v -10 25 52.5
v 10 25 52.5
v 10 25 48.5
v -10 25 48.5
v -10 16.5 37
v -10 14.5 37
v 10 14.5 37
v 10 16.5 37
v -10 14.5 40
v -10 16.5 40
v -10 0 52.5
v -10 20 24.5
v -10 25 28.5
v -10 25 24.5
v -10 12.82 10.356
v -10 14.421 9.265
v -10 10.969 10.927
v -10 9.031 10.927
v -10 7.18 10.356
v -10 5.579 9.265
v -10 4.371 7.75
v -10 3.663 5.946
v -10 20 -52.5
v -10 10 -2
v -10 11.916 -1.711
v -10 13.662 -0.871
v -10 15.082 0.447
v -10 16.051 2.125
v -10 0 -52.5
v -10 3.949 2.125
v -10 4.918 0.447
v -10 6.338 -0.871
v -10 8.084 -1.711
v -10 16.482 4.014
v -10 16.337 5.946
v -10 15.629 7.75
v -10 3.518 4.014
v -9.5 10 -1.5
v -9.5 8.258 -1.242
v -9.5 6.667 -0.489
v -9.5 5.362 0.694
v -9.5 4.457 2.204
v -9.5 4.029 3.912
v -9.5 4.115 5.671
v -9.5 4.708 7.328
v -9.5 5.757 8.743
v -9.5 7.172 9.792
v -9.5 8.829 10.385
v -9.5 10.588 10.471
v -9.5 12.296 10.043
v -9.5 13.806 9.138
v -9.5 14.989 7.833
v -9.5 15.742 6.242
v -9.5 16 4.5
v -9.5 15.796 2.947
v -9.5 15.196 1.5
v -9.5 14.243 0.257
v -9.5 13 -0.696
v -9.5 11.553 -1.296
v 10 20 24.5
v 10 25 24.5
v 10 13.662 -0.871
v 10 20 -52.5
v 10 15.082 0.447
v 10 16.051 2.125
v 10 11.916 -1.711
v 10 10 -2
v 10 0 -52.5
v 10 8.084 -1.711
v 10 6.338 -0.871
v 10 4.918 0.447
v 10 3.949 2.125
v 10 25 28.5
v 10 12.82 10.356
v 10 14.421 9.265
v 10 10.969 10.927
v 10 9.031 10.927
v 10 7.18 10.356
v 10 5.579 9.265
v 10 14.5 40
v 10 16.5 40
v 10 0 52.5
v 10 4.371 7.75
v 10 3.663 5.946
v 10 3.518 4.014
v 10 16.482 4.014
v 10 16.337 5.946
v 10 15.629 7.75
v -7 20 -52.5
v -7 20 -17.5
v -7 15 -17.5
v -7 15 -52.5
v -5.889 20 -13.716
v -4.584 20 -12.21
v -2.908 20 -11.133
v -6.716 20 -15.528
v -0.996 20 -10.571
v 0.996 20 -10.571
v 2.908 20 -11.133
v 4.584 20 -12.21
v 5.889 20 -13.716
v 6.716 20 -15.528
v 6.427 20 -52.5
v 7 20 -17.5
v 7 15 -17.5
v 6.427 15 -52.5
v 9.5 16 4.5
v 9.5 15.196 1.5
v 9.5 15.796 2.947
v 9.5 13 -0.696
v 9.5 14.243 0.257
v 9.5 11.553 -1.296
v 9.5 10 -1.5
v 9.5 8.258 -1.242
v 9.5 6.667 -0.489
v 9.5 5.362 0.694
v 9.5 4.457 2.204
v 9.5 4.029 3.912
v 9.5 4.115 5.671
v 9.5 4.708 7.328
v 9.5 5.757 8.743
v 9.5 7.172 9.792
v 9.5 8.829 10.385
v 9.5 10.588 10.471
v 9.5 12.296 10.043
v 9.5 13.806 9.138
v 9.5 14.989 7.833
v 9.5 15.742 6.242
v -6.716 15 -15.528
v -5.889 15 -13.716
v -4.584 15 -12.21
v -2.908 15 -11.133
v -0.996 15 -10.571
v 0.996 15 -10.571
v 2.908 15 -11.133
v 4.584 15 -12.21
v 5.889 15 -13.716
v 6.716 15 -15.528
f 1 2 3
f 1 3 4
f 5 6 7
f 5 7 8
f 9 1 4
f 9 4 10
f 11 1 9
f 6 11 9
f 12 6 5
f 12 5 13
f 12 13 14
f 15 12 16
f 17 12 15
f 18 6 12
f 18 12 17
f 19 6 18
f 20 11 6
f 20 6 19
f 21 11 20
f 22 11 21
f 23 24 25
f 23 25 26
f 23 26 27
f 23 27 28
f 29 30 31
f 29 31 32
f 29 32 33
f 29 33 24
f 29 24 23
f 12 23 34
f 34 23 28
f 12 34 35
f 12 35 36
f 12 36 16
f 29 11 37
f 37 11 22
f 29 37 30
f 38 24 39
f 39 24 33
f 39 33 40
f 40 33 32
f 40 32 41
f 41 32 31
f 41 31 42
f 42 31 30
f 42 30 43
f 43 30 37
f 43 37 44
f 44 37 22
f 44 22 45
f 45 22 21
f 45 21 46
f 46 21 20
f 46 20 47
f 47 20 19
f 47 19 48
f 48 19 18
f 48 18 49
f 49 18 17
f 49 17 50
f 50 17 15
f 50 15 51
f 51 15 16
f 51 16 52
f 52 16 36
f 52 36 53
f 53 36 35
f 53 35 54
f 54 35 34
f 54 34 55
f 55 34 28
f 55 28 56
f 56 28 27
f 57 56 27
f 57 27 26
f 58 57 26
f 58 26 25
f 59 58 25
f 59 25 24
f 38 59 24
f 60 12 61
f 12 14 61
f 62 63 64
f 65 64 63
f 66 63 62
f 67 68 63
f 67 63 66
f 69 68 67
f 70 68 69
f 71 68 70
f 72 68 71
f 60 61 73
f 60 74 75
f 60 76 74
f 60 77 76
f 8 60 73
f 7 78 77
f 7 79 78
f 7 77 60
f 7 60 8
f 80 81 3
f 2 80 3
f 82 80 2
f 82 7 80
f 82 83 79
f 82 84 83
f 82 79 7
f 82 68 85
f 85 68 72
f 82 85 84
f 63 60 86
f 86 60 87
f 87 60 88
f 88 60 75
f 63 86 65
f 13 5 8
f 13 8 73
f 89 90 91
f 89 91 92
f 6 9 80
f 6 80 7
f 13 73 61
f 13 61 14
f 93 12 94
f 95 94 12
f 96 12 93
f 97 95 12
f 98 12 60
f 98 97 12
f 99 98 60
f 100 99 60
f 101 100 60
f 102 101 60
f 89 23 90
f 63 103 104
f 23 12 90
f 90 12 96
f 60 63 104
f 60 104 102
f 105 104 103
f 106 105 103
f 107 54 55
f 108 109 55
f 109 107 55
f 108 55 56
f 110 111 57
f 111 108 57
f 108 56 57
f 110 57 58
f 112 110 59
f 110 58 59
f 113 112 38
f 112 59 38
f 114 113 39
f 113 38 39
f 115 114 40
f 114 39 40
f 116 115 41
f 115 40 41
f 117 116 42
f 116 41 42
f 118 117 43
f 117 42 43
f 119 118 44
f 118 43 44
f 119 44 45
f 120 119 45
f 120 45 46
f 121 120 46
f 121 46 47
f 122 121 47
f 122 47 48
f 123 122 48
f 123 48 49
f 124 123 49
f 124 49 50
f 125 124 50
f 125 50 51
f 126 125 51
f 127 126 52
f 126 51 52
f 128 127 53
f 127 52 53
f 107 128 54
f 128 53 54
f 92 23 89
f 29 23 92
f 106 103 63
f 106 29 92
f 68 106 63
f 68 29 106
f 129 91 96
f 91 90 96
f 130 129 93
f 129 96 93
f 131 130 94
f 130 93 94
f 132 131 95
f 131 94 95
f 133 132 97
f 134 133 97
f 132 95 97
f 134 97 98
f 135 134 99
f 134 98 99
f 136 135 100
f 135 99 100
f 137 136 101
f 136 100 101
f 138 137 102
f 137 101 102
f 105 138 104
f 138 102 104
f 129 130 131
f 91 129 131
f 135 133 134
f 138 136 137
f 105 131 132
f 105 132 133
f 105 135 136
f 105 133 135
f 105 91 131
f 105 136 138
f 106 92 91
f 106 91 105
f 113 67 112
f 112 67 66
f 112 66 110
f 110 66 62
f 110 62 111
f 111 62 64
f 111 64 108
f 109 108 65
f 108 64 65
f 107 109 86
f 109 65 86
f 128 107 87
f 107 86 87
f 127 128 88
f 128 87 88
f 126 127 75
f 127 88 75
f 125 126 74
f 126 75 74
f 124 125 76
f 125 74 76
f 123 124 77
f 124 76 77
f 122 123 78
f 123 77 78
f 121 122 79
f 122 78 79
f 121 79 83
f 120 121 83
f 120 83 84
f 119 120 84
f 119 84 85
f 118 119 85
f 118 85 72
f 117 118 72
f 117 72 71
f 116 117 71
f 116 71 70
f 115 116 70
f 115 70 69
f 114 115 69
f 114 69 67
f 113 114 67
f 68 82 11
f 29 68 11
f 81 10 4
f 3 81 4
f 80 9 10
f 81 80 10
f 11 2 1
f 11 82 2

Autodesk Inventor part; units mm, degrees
ref_plane "YZ Plane" through (0, 0, 0) normal (1, 0, 0) x (0, 1, 0)
ref_plane "XY Plane" through (0, 0, 0) normal (0, 0, 1) x (1, 0, 0)
sketch "草图1" plane through (0, 0, 0) normal (0, 1, 0) x (-1, 0, 0)
  line L0 (10, -52.5) -> (-10, -52.5)
  line L1 (-10, -52.5) -> (-10, 52.5)
  line L2 (-10, 52.5) -> (10, 52.5)
  line L3 (10, 52.5) -> (10, -52.5)
  line L4 (10, -52.5) -> (-10, 52.5) construction
  line L5 (-10, -52.5) -> (10, 52.5) construction
  point P0 (0, 0)
  dimension "d0" = 20
  dimension "d1" = 105
extrude "拉伸1" add sketch "草图1" along normal blind 25
sketch "草图3" plane through (0, 25, 0) normal (0, 1, 0) x (1, 0, 0)
  line L0 (10, -52.5) -> (10, 52.5) projected
  line L1 (10, 52.5) -> (-10, 52.5) projected
  line L2 (-10, 52.5) -> (-10, -52.5) projected
  line L3 (-10, 52.5) -> (-10, -52.5) projected
  line L4 (-10, -52.5) -> (10, -52.5) projected
  line L5 (10, -52.5) -> (10, 52.5) projected
  line L6 (-10, 52.5) -> (-10, -28.5) projected
  line L7 (-10, -24.5) -> (10, -24.5)
  line L8 (10, -52.5) -> (10, 52.5) projected
  line L9 (10, 52.5) -> (-10, 52.5) projected
  line L10 (-10, -52.5) -> (10, -52.5) projected
  point P0 (0, 0)
  point P1 (10, -28.5)
  point P2 (10, -48.5)
  dimension "d12" = 28
extrude "拉伸3" cut sketch "草图3" against normal blind 5 contours L7 L2 L1 L0
sketch "草图4" plane through (0, 20, 0) normal (0, 1, 0) x (1, 0, 0)
  point P0 (0, 0)
sketch "草图6" plane through (0, 0, 0) normal (1, 0, 0) x (0, 1, 0)
  line L0 (0, -52.5) -> (20, -52.5) projected
  line L1 (0, -52.5) -> (0, 52.5) projected
  circle A0 centre (10, 4.5) radius 6
  point P0 (0, 0)
  point P1 (15, -52.5)
  dimension "d18" = 57
  dimension "d19" = 10
  dimension "d20" = 12
extrude "拉伸5" cut sketch "草图6" along normal mid plane 19
ref_plane "工作平面1" through (0, 10, 0) normal (0, 1, 0) x (-1, 0, 0)
sketch "草图8" plane through (0, 10, 0) normal (0, 1, 0) x (-1, 0, 0)
  line L0 (10, 52.5) -> (-10, 52.5) projected
  line L1 (10, -52.5) -> (10, 52.5) projected
  line L2 (-10, -52.5) -> (10, -52.5) projected
  line L3 (-10, 52.5) -> (-10, -52.5) projected
  line L4 (9.5, -1.5) -> (9.5, 10.5) projected
  line L5 (-9.5, 10.5) -> (-9.5, -1.5) projected
  line L6 (9.5, -1.5) -> (9.5, 10.5) projected
  line L7 (9.5, 4.5) -> (10, 4.5)
  line L8 (10, -52.5) -> (10, 52.5) projected
  line L9 (9.5, -1.5) -> (10, -2)
  line L10 (10, -2) -> (10, 4.5)
  line L11 (9.5, 4.5) -> (9.5, -1.5)
  line L12 (10, 4.5) -> (-10, 4.5)
  line L13 (-10, 52.5) -> (-10, -52.5) projected
  point P0 (0, 0)
  dimension "d24" = 135
revolve "旋转1" cut sketch "草图8" angle 360 about axis through (-10, 10, 4.5) along (1, 0, 0) contours L1 L9 L4 L7
mirror "镜像1" about plane through (0, 0, 0) normal (1, 0, 0) of "旋转1"
sketch "草图9" plane through (0, 0, 0) normal (1, 0, 0) x (0, 1, 0)
  line L0 (0, -52.5) -> (20, -52.5) projected
  line L1 (25, 24.5) -> (25, 52.5) projected
  line L2 (14.5, 38.5) -> (31.5646, 38.5)
  line L3 (14.5, 38.5) -> (14.5, 37)
  line L4 (14.5, 37) -> (16.5, 37)
  line L5 (16.5, 37) -> (25, 28.5)
  line L6 (25, 28.5) -> (25, 38.5)
  line L7 (25, 52.5) -> (25, 24.5)
  line L8 (14.5, 40) -> (16.5, 40)
  line L9 (16.5, 40) -> (25, 48.5)
  line L10 (14.5, 40) -> (14.5, 38.5)
  point P0 (0, 0)
  point P1 (15, -52.5)
  dimension "d26" = 91
  dimension "d27" = 10.5
  dimension "d28" = 1.5
  dimension "d29" = 2
  dimension "d30" = 45
extrude "拉伸6" cut sketch "草图9" along normal through all both and the other way through all
sketch "草图10" plane through (0, 20, 0) normal (0, 1, 0) x (1, 0, 0)
  line L0 (-10, 52.5) -> (-10, -52.5) projected
  line L1 (-10, 17.5) -> (10, 17.5)
  line L2 (10, -52.5) -> (10, 52.5) projected
  line L3 (-10, 52.5) -> (10, 52.5) projected
  circle A0 centre (0, 17.5) radius 7
  line L4 (-7, 17.5) -> (-7, 52.5)
  line L5 (10, 52.5) -> (-10, 52.5) projected
  line L6 (7, 17.5) -> (6.4266, 52.5)
  point P0 (0, 0)
  point P1 (6.9962, 17.7293)
  dimension "d33" = 35
  dimension "d34" = 14
extrude "拉伸7" cut sketch "草图10" against normal blind 5 contours L3 L6 L1 L4 | L1 A0
properties part number "5-压铁" material "不锈钢"
